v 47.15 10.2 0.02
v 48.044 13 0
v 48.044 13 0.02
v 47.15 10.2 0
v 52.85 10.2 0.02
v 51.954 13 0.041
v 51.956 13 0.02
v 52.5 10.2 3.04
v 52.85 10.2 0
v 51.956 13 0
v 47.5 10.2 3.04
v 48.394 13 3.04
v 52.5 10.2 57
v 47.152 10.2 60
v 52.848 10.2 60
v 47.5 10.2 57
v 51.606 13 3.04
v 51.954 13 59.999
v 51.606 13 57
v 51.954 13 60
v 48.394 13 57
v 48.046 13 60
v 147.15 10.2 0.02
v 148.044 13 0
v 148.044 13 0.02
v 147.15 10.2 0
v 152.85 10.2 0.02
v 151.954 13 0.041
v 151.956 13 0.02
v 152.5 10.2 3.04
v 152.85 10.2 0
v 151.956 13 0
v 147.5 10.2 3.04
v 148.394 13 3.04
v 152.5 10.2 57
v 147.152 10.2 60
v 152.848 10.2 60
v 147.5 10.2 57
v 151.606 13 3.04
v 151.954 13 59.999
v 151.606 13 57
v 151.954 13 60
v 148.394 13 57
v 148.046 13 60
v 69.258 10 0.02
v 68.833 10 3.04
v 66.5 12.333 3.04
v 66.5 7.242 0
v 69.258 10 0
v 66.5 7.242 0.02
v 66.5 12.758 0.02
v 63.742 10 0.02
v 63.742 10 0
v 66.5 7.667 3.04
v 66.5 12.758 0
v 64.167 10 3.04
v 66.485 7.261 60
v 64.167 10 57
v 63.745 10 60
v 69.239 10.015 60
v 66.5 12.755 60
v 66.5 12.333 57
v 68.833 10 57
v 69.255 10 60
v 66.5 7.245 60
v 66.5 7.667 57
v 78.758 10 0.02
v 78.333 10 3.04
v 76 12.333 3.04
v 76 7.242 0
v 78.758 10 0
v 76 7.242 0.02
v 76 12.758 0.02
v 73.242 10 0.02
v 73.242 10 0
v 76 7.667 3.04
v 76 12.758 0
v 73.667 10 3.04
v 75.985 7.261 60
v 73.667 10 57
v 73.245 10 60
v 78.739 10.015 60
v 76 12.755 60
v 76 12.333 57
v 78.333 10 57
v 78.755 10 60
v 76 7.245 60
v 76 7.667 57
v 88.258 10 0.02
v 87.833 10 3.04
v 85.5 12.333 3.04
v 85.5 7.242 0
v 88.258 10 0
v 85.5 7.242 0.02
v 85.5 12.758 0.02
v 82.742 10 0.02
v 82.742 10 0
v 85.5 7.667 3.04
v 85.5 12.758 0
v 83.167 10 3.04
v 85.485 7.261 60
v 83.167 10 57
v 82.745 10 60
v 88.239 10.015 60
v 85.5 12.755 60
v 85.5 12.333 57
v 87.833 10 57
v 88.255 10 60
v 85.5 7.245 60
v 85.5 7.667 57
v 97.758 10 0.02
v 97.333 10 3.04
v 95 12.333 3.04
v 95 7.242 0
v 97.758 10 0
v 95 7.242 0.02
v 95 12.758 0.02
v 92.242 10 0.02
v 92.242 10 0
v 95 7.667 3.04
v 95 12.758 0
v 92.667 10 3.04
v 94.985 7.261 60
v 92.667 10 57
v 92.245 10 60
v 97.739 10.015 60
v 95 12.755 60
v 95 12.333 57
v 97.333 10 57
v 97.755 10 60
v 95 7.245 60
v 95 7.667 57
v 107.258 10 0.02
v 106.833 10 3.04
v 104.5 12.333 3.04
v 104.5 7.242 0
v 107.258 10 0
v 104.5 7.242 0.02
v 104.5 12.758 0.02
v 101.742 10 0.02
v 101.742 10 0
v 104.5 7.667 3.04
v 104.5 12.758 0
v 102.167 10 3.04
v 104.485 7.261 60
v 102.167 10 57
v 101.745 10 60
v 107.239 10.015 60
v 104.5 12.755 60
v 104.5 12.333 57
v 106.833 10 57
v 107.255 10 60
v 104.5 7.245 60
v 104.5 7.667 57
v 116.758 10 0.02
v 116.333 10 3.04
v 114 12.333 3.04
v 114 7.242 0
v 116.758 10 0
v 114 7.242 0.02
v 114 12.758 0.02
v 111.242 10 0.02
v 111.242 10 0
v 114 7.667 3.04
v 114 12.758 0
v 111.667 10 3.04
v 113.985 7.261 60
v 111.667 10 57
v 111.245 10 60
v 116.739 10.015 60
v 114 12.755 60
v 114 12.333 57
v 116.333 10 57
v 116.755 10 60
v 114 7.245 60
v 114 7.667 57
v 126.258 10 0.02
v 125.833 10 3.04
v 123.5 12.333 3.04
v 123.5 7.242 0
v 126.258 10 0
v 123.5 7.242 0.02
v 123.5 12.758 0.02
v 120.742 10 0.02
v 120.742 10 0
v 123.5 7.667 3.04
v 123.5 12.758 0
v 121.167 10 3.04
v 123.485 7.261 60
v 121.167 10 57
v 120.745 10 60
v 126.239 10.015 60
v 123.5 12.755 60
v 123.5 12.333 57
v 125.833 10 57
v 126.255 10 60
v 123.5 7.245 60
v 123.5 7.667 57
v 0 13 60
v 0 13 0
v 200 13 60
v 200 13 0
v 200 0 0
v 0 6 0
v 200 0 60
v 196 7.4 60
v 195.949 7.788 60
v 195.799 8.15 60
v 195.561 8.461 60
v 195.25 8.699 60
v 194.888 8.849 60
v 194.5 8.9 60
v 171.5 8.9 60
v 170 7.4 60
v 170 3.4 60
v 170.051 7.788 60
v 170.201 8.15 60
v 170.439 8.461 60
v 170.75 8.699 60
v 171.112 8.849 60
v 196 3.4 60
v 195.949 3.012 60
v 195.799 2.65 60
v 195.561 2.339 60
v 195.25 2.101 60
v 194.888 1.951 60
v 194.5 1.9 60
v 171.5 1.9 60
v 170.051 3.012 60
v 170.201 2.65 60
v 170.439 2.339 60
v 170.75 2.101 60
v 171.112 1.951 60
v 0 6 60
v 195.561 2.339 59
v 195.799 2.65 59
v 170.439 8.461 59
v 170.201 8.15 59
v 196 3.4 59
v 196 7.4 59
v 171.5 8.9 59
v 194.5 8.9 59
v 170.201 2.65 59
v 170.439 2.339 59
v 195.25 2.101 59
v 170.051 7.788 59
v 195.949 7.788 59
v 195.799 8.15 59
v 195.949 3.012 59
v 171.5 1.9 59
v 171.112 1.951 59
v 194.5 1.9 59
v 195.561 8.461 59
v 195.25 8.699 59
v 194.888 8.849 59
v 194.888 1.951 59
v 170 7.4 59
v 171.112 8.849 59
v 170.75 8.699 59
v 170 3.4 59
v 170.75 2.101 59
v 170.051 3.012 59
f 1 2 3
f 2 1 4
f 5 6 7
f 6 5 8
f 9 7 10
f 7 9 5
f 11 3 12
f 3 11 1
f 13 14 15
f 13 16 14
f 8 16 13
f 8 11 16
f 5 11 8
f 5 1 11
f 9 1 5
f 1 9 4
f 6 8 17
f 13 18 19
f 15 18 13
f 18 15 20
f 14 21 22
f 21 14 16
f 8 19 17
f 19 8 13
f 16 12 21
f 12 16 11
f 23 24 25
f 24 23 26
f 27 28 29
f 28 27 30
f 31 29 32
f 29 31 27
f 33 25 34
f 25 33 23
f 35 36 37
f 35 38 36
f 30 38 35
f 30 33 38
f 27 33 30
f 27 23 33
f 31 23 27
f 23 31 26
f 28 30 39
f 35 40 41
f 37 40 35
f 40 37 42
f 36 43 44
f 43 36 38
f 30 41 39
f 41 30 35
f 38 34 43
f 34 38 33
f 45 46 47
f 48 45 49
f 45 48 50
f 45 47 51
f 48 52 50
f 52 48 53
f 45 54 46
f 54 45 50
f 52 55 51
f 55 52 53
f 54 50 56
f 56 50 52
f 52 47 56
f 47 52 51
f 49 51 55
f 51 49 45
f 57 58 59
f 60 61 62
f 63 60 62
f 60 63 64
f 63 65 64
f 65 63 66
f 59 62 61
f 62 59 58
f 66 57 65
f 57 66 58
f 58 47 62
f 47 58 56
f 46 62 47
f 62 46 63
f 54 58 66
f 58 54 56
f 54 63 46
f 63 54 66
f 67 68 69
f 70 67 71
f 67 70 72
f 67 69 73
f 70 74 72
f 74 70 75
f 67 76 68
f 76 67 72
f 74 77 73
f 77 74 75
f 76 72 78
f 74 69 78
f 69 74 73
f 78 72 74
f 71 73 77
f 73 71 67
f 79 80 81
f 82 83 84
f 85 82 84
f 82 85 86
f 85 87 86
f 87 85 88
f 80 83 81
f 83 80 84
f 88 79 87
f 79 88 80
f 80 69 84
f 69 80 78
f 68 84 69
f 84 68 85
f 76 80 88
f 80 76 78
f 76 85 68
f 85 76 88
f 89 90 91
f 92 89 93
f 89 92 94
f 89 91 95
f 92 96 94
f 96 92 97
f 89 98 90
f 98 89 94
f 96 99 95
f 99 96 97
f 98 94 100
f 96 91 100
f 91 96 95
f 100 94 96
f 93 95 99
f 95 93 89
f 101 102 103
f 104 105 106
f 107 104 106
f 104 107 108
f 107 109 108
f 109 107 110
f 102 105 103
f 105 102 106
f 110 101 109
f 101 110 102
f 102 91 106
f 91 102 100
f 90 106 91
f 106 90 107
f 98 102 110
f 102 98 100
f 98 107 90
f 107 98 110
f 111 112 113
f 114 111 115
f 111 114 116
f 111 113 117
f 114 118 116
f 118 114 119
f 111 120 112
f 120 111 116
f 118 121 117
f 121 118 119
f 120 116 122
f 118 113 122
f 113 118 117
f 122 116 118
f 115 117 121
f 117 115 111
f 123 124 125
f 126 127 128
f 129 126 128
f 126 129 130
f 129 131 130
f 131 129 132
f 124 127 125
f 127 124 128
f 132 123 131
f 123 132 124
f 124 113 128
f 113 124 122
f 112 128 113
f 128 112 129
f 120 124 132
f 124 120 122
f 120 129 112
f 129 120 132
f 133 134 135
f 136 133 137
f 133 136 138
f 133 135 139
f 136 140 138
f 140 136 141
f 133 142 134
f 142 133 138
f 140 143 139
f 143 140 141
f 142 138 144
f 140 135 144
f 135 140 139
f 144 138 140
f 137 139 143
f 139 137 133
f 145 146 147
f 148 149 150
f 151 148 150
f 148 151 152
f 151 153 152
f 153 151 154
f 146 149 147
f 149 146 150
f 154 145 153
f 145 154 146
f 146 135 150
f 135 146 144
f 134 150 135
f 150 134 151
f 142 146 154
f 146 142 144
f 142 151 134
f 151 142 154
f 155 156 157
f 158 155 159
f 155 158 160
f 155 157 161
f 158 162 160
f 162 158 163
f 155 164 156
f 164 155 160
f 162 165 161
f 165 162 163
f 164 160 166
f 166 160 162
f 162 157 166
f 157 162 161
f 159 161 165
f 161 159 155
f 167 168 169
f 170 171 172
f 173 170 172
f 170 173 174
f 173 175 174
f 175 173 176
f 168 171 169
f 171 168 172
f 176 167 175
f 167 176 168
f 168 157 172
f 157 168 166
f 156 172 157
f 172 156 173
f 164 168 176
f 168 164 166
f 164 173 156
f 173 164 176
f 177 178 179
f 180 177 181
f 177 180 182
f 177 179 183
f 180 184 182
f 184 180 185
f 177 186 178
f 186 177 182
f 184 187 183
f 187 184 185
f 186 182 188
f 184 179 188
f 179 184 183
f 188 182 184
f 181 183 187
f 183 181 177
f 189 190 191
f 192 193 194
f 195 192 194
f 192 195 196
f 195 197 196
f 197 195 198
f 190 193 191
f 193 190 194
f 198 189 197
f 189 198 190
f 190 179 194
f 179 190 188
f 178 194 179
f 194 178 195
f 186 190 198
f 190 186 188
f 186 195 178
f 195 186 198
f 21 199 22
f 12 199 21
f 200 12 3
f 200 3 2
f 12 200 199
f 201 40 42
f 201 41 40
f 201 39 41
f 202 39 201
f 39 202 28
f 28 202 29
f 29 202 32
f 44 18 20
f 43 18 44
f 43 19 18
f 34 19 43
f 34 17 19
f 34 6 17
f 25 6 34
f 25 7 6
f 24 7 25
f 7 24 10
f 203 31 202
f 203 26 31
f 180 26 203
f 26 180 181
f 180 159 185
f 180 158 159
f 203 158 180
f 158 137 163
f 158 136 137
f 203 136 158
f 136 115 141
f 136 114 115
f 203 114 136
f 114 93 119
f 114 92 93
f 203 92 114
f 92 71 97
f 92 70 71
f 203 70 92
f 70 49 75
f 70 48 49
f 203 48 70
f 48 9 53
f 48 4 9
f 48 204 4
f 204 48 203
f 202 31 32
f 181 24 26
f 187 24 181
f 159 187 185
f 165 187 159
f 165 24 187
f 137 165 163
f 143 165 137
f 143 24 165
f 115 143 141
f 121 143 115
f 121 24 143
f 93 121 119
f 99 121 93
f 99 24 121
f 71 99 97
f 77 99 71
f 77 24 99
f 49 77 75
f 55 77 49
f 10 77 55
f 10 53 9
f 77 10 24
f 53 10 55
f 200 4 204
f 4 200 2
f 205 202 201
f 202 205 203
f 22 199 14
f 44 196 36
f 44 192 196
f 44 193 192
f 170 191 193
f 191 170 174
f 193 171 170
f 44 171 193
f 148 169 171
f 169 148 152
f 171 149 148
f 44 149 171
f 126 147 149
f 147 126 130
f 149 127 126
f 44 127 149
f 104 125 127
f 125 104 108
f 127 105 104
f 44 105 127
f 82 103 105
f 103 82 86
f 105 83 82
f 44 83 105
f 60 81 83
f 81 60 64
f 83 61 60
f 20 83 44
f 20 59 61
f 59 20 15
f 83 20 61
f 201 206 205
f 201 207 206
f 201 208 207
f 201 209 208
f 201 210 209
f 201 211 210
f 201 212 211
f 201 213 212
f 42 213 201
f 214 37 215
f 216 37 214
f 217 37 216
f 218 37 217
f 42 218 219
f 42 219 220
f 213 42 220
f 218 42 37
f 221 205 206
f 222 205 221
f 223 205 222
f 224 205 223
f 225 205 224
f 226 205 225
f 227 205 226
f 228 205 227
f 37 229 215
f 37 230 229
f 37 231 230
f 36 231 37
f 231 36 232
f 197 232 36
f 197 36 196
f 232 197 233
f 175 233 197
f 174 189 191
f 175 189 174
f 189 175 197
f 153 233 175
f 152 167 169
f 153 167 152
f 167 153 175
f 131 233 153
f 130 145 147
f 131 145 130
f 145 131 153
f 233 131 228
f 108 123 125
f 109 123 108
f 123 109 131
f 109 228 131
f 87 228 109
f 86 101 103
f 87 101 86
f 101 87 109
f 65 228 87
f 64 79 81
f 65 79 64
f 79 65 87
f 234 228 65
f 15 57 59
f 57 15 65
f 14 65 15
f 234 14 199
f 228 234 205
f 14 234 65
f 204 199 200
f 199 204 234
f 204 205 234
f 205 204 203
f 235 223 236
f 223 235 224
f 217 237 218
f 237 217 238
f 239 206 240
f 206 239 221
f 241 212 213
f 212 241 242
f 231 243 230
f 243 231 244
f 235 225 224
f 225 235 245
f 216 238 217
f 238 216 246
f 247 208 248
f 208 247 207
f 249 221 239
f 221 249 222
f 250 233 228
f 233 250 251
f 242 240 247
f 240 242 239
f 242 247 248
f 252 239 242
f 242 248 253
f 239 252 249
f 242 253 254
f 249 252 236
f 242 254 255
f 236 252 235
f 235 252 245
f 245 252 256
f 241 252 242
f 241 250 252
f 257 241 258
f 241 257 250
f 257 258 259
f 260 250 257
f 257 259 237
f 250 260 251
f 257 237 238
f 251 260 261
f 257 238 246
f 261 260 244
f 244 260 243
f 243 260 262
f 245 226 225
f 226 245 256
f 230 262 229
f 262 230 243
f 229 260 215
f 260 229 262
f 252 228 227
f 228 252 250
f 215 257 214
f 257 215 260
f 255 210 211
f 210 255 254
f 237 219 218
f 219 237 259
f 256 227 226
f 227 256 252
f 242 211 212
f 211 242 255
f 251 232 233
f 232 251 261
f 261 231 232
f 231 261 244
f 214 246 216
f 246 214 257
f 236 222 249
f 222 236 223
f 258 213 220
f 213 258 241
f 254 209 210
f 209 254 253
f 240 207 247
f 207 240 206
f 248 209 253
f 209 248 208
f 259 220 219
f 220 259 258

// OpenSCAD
// file: lib/label.scad
/* Rounded side recess for an adhesive polyester part-number label. */

module rounded_rectangle_2d(length_x, height_z, corner_radius) {
    assert(length_x > 2 * corner_radius,
        "Label recess length must exceed twice the corner radius");
    assert(height_z > 2 * corner_radius,
        "Label recess height must exceed twice the corner radius");

    hull()
        for (x_sign = [-1, 1], z_sign = [-1, 1])
            translate([
                x_sign * (length_x / 2 - corner_radius),
                z_sign * (height_z / 2 - corner_radius)
            ])
                circle(r = corner_radius, $fn = 24);
}

module side_label_recess_cut(
    side,
    wedge_width,
    center_x,
    center_z,
    length_x,
    height_z,
    corner_radius,
    depth,
    epsilon = 0.02
) {
    assert(side == "front" || side == "back",
        "Label side must be front or back");
    assert(depth > 0 && depth < wedge_width,
        "Label recess depth must be positive and less than wedge width");

    if (side == "front")
        translate([center_x, -epsilon, center_z])
            rotate([-90, 0, 0])
                linear_extrude(height = depth + epsilon, convexity = 10)
                    rounded_rectangle_2d(
                        length_x,
                        height_z,
                        corner_radius
                    );
    else
        translate([center_x, wedge_width + epsilon, center_z])
            rotate([90, 0, 0])
                linear_extrude(height = depth + epsilon, convexity = 10)
                    rounded_rectangle_2d(
                        length_x,
                        height_z,
                        corner_radius
                    );
}
// file: lib/dovetail.scad
/* Transverse dovetail geometry with canonical two-ended entry relief. */

function female_dovetail_points(
    center_x,
    head_width,
    neck_width,
    depth,
    epsilon = 0.02
) = [
    [center_x - neck_width / 2, -epsilon],
    [center_x + neck_width / 2, -epsilon],
    [center_x + head_width / 2, depth],
    [center_x - head_width / 2, depth]
];

function male_dovetail_points(center_x, head_width, neck_width, depth) = [
    [center_x - neck_width / 2, 0],
    [center_x + neck_width / 2, 0],
    [center_x + head_width / 2, depth],
    [center_x - head_width / 2, depth]
];

module prism_along_y(points, y_start, length) {
    translate([0, y_start + length, 0])
        rotate([90, 0, 0])
            linear_extrude(height = length, convexity = 10)
                polygon(points = points);
}

module section_at_y(points, y_position, thickness = 0.04) {
    prism_along_y(points, y_position, thickness);
}

module dovetail_socket_cut(
    center_x,
    span_y,
    head_width,
    neck_width,
    depth,
    entry_length,
    entry_relief,
    epsilon = 0.02
) {
    nominal = female_dovetail_points(
        center_x,
        head_width,
        neck_width,
        depth,
        epsilon
    );
    relieved = female_dovetail_points(
        center_x,
        head_width + 2 * entry_relief,
        neck_width + 2 * entry_relief,
        depth,
        epsilon
    );

    prism_along_y(nominal, -epsilon, span_y + 2 * epsilon);

    if (entry_length > 0 && entry_relief > 0) {
        hull() {
            section_at_y(relieved, -epsilon);
            section_at_y(nominal, entry_length);
        }
        hull() {
            section_at_y(nominal, span_y - entry_length);
            section_at_y(relieved, span_y + epsilon);
        }
    }
}

module male_dovetail_rail(
    span_y,
    head_width,
    neck_width,
    depth
) {
    prism_along_y(
        male_dovetail_points(0, head_width, neck_width, depth),
        0,
        span_y
    );
}
// file: lib/components.scad
/* Role-specific wedge components assembled from shared geometry. */

use <wedge.scad>
use <dovetail.scad>
use <registers.scad>
use <label.scad>

function midpoint(a, b) = (a + b) / 2;

function upper_mount_x_1(
    wedge_length,
    nominal_height,
    total_height_range,
    height_step,
    lower_register_center_x,
    lower_register_pitch,
    register_center_depth
) = midpoint(
    upper_register_local_x(
        -2,
        wedge_length,
        total_height_range,
        height_step,
        lower_register_center_x,
        lower_register_pitch,
        register_center_depth,
        nominal_height
    ),
    upper_register_local_x(
        -1,
        wedge_length,
        total_height_range,
        height_step,
        lower_register_center_x,
        lower_register_pitch,
        register_center_depth,
        nominal_height
    )
);

function upper_mount_x_2(
    wedge_length,
    nominal_height,
    total_height_range,
    height_step,
    lower_register_center_x,
    lower_register_pitch,
    register_center_depth
) = midpoint(
    upper_register_local_x(
        2,
        wedge_length,
        total_height_range,
        height_step,
        lower_register_center_x,
        lower_register_pitch,
        register_center_depth,
        nominal_height
    ),
    upper_register_local_x(
        3,
        wedge_length,
        total_height_range,
        height_step,
        lower_register_center_x,
        lower_register_pitch,
        register_center_depth,
        nominal_height
    )
);

function label_recess_length(wedge_length) = min(26, wedge_length * 0.18);
function label_recess_height() = 7;
function label_recess_end_margin() = 4;
function label_recess_top_margin() = 1;
function label_recess_corner_radius() = 1.5;

function label_recess_left_x(wedge_length) =
    wedge_length - label_recess_end_margin() - label_recess_length(wedge_length);

function label_recess_center_x(wedge_length) =
    label_recess_left_x(wedge_length) + label_recess_length(wedge_length) / 2;

function label_recess_center_z(
    wedge_length,
    nominal_height,
    total_height_range
) = wedge_height_at(
        label_recess_left_x(wedge_length),
        wedge_length,
        nominal_height,
        total_height_range
    )
    - label_recess_top_margin()
    - label_recess_height() / 2;

module mounting_socket_cuts(
    mounting_choice,
    wedge_width,
    x_1,
    x_2,
    dovetail_bridge_width,
    dovetail_neck_width,
    dovetail_depth,
    dovetail_entry_length,
    dovetail_entry_relief,
    epsilon = 0.02
) {
    if (mounting_choice == "single_dovetail"
        || mounting_choice == "two_dovetails")
        dovetail_socket_cut(
            x_1,
            wedge_width,
            dovetail_bridge_width,
            dovetail_neck_width,
            dovetail_depth,
            dovetail_entry_length,
            dovetail_entry_relief,
            epsilon
        );

    if (mounting_choice == "two_dovetails")
        dovetail_socket_cut(
            x_2,
            wedge_width,
            dovetail_bridge_width,
            dovetail_neck_width,
            dovetail_depth,
            dovetail_entry_length,
            dovetail_entry_relief,
            epsilon
        );
}

module lower_base_model(
    wedge_length,
    wedge_width,
    nominal_height,
    total_height_range,
    mounting_choice,
    dovetail_bridge_width,
    dovetail_neck_width,
    dovetail_depth,
    dovetail_entry_length,
    dovetail_entry_relief,
    include_registers,
    lower_register_center_x,
    lower_register_pitch,
    register_center_depth,
    diamond_square_side,
    diamond_entry_length,
    diamond_entry_relief,
    include_label_recess,
    label_recess_depth,
    epsilon = 0.02
) {
    lower_mount_x_1 = wedge_length * 0.25;
    lower_mount_x_2 = wedge_length * 0.75;

    difference() {
        smooth_wedge(
            wedge_length,
            wedge_width,
            nominal_height,
            total_height_range
        );

        mounting_socket_cuts(
            mounting_choice,
            wedge_width,
            lower_mount_x_1,
            lower_mount_x_2,
            dovetail_bridge_width,
            dovetail_neck_width,
            dovetail_depth,
            dovetail_entry_length,
            dovetail_entry_relief,
            epsilon
        );

        if (include_registers)
            lower_register_row(
                wedge_width,
                lower_register_center_x,
                lower_register_pitch,
                register_center_depth,
                diamond_square_side,
                diamond_entry_length,
                diamond_entry_relief,
                epsilon
            );

        if (include_label_recess)
            side_label_recess_cut(
                "back",
                wedge_width,
                label_recess_center_x(wedge_length),
                label_recess_center_z(
                    wedge_length,
                    nominal_height,
                    total_height_range
                ),
                label_recess_length(wedge_length),
                label_recess_height(),
                label_recess_corner_radius(),
                label_recess_depth,
                epsilon
            );
    }
}

module upper_slide_model(
    wedge_length,
    wedge_width,
    nominal_height,
    total_height_range,
    height_step,
    mounting_choice,
    dovetail_bridge_width,
    dovetail_neck_width,
    dovetail_depth,
    dovetail_entry_length,
    dovetail_entry_relief,
    include_registers,
    lower_register_center_x,
    lower_register_pitch,
    register_center_depth,
    diamond_square_side,
    diamond_entry_length,
    diamond_entry_relief,
    include_label_recess,
    label_recess_depth,
    epsilon = 0.02
) {
    upper_mount_1 = upper_mount_x_1(
        wedge_length,
        nominal_height,
        total_height_range,
        height_step,
        lower_register_center_x,
        lower_register_pitch,
        register_center_depth
    );
    upper_mount_2 = upper_mount_x_2(
        wedge_length,
        nominal_height,
        total_height_range,
        height_step,
        lower_register_center_x,
        lower_register_pitch,
        register_center_depth
    );

    difference() {
        smooth_wedge(
            wedge_length,
            wedge_width,
            nominal_height,
            total_height_range
        );

        mounting_socket_cuts(
            mounting_choice,
            wedge_width,
            upper_mount_1,
            upper_mount_2,
            dovetail_bridge_width,
            dovetail_neck_width,
            dovetail_depth,
            dovetail_entry_length,
            dovetail_entry_relief,
            epsilon
        );

        if (include_registers)
            upper_register_row(
                wedge_length,
                wedge_width,
                nominal_height,
                total_height_range,
                height_step,
                lower_register_center_x,
                lower_register_pitch,
                register_center_depth,
                diamond_square_side,
                diamond_entry_length,
                diamond_entry_relief,
                epsilon
            );

        if (include_label_recess)
            side_label_recess_cut(
                "front",
                wedge_width,
                label_recess_center_x(wedge_length),
                label_recess_center_z(
                    wedge_length,
                    nominal_height,
                    total_height_range
                ),
                label_recess_length(wedge_length),
                label_recess_height(),
                label_recess_corner_radius(),
                label_recess_depth,
                epsilon
            );
    }
}
// file: lib/registers.scad
/* Diamond garden-stake registers and seven-position kinematics. */

function lock_positions() = [-3, -2, -1, 0, 1, 2, 3];

function travel_per_height_step(
    wedge_length,
    total_height_range,
    height_step
) = height_step / (total_height_range / wedge_length);

function lock_shift(
    position,
    wedge_length,
    total_height_range,
    height_step
) = position * travel_per_height_step(
    wedge_length,
    total_height_range,
    height_step
);

function lock_height(position, nominal_height, height_step) =
    nominal_height + position * height_step;

function lower_register_x(position, center_x, pitch) =
    center_x + position * pitch;

function nominal_lock_dx(nominal_height, register_center_depth) =
    nominal_height - 2 * register_center_depth;

function upper_register_local_x(
    position,
    wedge_length,
    total_height_range,
    height_step,
    lower_center_x,
    lower_pitch,
    register_center_depth,
    nominal_height
) =
    wedge_length
    + lock_shift(position, wedge_length, total_height_range, height_step)
    - lower_register_x(position, lower_center_x, lower_pitch)
    - nominal_lock_dx(nominal_height, register_center_depth);

function upper_register_global_x(
    position,
    wedge_length,
    total_height_range,
    height_step,
    upper_local_x
) =
    wedge_length
    + lock_shift(position, wedge_length, total_height_range, height_step)
    - upper_local_x;

function diamond_half_diagonal(square_side) = square_side / sqrt(2);

function diamond_points(center_x, center_z, square_side) = [
    [center_x, center_z - diamond_half_diagonal(square_side)],
    [center_x + diamond_half_diagonal(square_side), center_z],
    [center_x, center_z + diamond_half_diagonal(square_side)],
    [center_x - diamond_half_diagonal(square_side), center_z]
];

module register_prism_along_y(points, y_start, length) {
    translate([0, y_start + length, 0])
        rotate([90, 0, 0])
            linear_extrude(height = length, convexity = 10)
                polygon(points = points);
}

module register_section_at_y(points, y_position, thickness = 0.04) {
    register_prism_along_y(points, y_position, thickness);
}

module diamond_tunnel_cut(
    center_x,
    center_z,
    span_y,
    square_side,
    entry_length,
    entry_relief,
    epsilon = 0.02
) {
    nominal = diamond_points(center_x, center_z, square_side);
    relieved = diamond_points(
        center_x,
        center_z,
        square_side + 2 * entry_relief
    );

    register_prism_along_y(
        nominal,
        -epsilon,
        span_y + 2 * epsilon
    );

    if (entry_length > 0 && entry_relief > 0) {
        hull() {
            register_section_at_y(relieved, -epsilon);
            register_section_at_y(nominal, entry_length);
        }
        hull() {
            register_section_at_y(nominal, span_y - entry_length);
            register_section_at_y(relieved, span_y + epsilon);
        }
    }
}

module lower_register_row(
    wedge_width,
    center_x,
    pitch,
    center_z,
    square_side,
    entry_length,
    entry_relief,
    epsilon = 0.02
) {
    for (position = lock_positions())
        diamond_tunnel_cut(
            lower_register_x(position, center_x, pitch),
            center_z,
            wedge_width,
            square_side,
            entry_length,
            entry_relief,
            epsilon
        );
}

module upper_register_row(
    wedge_length,
    wedge_width,
    nominal_height,
    total_height_range,
    height_step,
    lower_center_x,
    lower_pitch,
    center_z,
    square_side,
    entry_length,
    entry_relief,
    epsilon = 0.02
) {
    for (position = lock_positions())
        diamond_tunnel_cut(
            upper_register_local_x(
                position,
                wedge_length,
                total_height_range,
                height_step,
                lower_center_x,
                lower_pitch,
                center_z,
                nominal_height
            ),
            center_z,
            wedge_width,
            square_side,
            entry_length,
            entry_relief,
            epsilon
        );
}

module rod_along_y(x, y_start, z, length, radius, facets = 32) {
    translate([x, y_start, z])
        rotate([-90, 0, 0])
            cylinder(h = length, r = radius, $fn = facets);
}

module garden_stake_preview(
    lower_x,
    lower_z,
    upper_x,
    upper_z,
    wedge_width,
    wire_diameter,
    handle_offset = 10,
    tip_overhang = 8
) {
    radius = wire_diameter / 2;
    y_start = -handle_offset;
    leg_length = wedge_width + handle_offset + tip_overhang;

    rod_along_y(lower_x, y_start, lower_z, leg_length, radius);
    rod_along_y(upper_x, y_start, upper_z, leg_length, radius);

    hull() {
        translate([lower_x, y_start, lower_z]) sphere(r = radius, $fn = 24);
        translate([upper_x, y_start, upper_z]) sphere(r = radius, $fn = 24);
    }
}
// file: lib/wedge.scad
/* Shared smooth wedge geometry. */

function wedge_thin_end(nominal_height, total_height_range) =
    (nominal_height - total_height_range) / 2;

function wedge_thick_end(nominal_height, total_height_range) =
    (nominal_height + total_height_range) / 2;

function wedge_slope(wedge_length, total_height_range) =
    total_height_range / wedge_length;

function wedge_angle(wedge_length, total_height_range) =
    atan(wedge_slope(wedge_length, total_height_range));

function wedge_height_at(
    x,
    wedge_length,
    nominal_height,
    total_height_range
) =
    wedge_thin_end(nominal_height, total_height_range)
    + wedge_slope(wedge_length, total_height_range) * x;

module smooth_wedge(
    wedge_length,
    wedge_width,
    nominal_height,
    total_height_range
) {
    thin_end = wedge_thin_end(nominal_height, total_height_range);
    thick_end = wedge_thick_end(nominal_height, total_height_range);

    polyhedron(
        points = [
            [0,            0,           0],
            [wedge_length, 0,           0],
            [wedge_length, wedge_width, 0],
            [0,            wedge_width, 0],
            [0,            0,           thin_end],
            [wedge_length, 0,           thick_end],
            [wedge_length, wedge_width, thick_end],
            [0,            wedge_width, thin_end]
        ],
        faces = [
            [0, 3, 2, 1],
            [0, 1, 5, 4],
            [1, 2, 6, 5],
            [2, 3, 7, 6],
            [3, 0, 4, 7],
            [4, 5, 6, 7]
        ],
        convexity = 10
    );
}
// main file
/*
  Locking Wedge — lower base
  Batch 003

  Default output is rotated onto the side opposite the label recess,
  leaving the rounded label pocket facing upward for support-free printing.
*/

use <lib/wedge.scad>
use <lib/registers.scad>
use <lib/components.scad>

// ---------- Wedge ----------

wedge_length = 200;       // [100:1:200]
wedge_width = 60;         // [20:1:180]
nominal_height = 20;      // [10:0.5:50]
total_height_range = 6;   // [2:0.5:20]
print_on_side = true;

// ---------- Transverse mounting sockets ----------

mounting_choice = "two_dovetails"; // [none:No mounting sockets,single_dovetail:One female dovetail,two_dovetails:Two female dovetails]
dovetail_bridge_width = 5.0; // [4:0.1:6]
dovetail_neck_width = 3.2;   // [2.4:0.1:5]
dovetail_depth = 2.8;        // [1.5:0.1:4]
dovetail_entry_length = 3.0; // [1:0.5:8]
dovetail_entry_relief = 0.35;// [0.1:0.05:1]

// ---------- Garden-stake registers ----------

include_registers = true;
height_step = 1.0;            // [0.5:0.5:2]
lower_register_center_x = 95; // [70:0.5:130]
lower_register_pitch = 9.5;   // [7:0.5:15]
register_center_depth = 3.0;  // [2.5:0.1:5]
wire_diameter = 3.0;          // [2:0.1:5]
diamond_clearance = 0.30;     // [0.1:0.05:0.8]
diamond_entry_length = 3.0;   // [1:0.5:8]
diamond_entry_relief = 0.30;  // [0.1:0.05:0.8]

// ---------- Adhesive label recess ----------

include_label_recess = true;
label_recess_depth = 1.0; // [0.8:0.1:1.2]

epsilon = 0.02;
diamond_square_side = wire_diameter + diamond_clearance;

// ---------- Validation ----------

thin_end = wedge_thin_end(nominal_height, total_height_range);
thick_end = wedge_thick_end(nominal_height, total_height_range);
half_diagonal = diamond_half_diagonal(diamond_square_side);
minimum_lower_x = lower_register_x(-3, lower_register_center_x, lower_register_pitch);
maximum_lower_x = lower_register_x(3, lower_register_center_x, lower_register_pitch);
minimum_register_roof = wedge_height_at(
    minimum_lower_x,
    wedge_length,
    nominal_height,
    total_height_range
) - register_center_depth - half_diagonal;
label_left = label_recess_left_x(wedge_length);
label_bottom = label_recess_center_z(
    wedge_length,
    nominal_height,
    total_height_range
) - label_recess_height() / 2;

assert(wedge_length > 0 && wedge_width > 0,
    "Wedge dimensions must be positive");
assert(nominal_height > total_height_range,
    "nominal_height must exceed total_height_range");
assert(thin_end > 0, "Derived thin end must be positive");
assert(dovetail_neck_width < dovetail_bridge_width,
    "Dovetail neck must be narrower than bridge width");
assert(dovetail_bridge_width <= 6,
    "Flat-print dovetail bridge should remain at or below 6 mm");
assert(register_center_depth > half_diagonal + 0.4,
    "Diamond tunnel needs at least 0.4 mm outer skin");
assert(minimum_lower_x > half_diagonal,
    "First lower register is outside the wedge");
assert(maximum_lower_x < wedge_length - half_diagonal,
    "Last lower register is outside the wedge");
assert(minimum_register_roof > 2,
    "Lower register row leaves less than 2 mm to the mating face");
assert(label_recess_depth >= 0.8 && label_recess_depth <= 1.2,
    "Label recess depth must remain between 0.8 and 1.2 mm");
assert(label_left > maximum_lower_x + half_diagonal + 4,
    "Label recess is too close to the nearest lower register");
assert(label_bottom > 0.8,
    "Label recess is too close to the flat external face");

// ---------- Output ----------

module lower_output() {
    lower_base_model(
        wedge_length,
        wedge_width,
        nominal_height,
        total_height_range,
        mounting_choice,
        dovetail_bridge_width,
        dovetail_neck_width,
        dovetail_depth,
        dovetail_entry_length,
        dovetail_entry_relief,
        include_registers,
        lower_register_center_x,
        lower_register_pitch,
        register_center_depth,
        diamond_square_side,
        diamond_entry_length,
        diamond_entry_relief,
        include_label_recess,
        label_recess_depth,
        epsilon
    );
}

if (print_on_side)
    translate([0, thick_end, 0])
        rotate([90, 0, 0])
            lower_output();
else
    lower_output();

// ---------- Console report ----------

echo(str("Part: lower base"));
echo(str("Wedge: ", wedge_length, " x ", wedge_width, " mm"));
echo(str("End thicknesses: ", thin_end, " to ", thick_end, " mm"));
echo(str("Wedge angle: ",
    wedge_angle(wedge_length, total_height_range), " degrees"));
echo(str("Lower register X range: ", minimum_lower_x,
    " to ", maximum_lower_x, " mm"));
echo(str("Diamond square side: ", diamond_square_side, " mm"));
echo(str("Outer skin below diamond: ",
    register_center_depth - half_diagonal, " mm"));
echo(str("Label recess: ", label_recess_length(wedge_length),
    " x ", label_recess_height(), " x ", label_recess_depth, " mm"));
